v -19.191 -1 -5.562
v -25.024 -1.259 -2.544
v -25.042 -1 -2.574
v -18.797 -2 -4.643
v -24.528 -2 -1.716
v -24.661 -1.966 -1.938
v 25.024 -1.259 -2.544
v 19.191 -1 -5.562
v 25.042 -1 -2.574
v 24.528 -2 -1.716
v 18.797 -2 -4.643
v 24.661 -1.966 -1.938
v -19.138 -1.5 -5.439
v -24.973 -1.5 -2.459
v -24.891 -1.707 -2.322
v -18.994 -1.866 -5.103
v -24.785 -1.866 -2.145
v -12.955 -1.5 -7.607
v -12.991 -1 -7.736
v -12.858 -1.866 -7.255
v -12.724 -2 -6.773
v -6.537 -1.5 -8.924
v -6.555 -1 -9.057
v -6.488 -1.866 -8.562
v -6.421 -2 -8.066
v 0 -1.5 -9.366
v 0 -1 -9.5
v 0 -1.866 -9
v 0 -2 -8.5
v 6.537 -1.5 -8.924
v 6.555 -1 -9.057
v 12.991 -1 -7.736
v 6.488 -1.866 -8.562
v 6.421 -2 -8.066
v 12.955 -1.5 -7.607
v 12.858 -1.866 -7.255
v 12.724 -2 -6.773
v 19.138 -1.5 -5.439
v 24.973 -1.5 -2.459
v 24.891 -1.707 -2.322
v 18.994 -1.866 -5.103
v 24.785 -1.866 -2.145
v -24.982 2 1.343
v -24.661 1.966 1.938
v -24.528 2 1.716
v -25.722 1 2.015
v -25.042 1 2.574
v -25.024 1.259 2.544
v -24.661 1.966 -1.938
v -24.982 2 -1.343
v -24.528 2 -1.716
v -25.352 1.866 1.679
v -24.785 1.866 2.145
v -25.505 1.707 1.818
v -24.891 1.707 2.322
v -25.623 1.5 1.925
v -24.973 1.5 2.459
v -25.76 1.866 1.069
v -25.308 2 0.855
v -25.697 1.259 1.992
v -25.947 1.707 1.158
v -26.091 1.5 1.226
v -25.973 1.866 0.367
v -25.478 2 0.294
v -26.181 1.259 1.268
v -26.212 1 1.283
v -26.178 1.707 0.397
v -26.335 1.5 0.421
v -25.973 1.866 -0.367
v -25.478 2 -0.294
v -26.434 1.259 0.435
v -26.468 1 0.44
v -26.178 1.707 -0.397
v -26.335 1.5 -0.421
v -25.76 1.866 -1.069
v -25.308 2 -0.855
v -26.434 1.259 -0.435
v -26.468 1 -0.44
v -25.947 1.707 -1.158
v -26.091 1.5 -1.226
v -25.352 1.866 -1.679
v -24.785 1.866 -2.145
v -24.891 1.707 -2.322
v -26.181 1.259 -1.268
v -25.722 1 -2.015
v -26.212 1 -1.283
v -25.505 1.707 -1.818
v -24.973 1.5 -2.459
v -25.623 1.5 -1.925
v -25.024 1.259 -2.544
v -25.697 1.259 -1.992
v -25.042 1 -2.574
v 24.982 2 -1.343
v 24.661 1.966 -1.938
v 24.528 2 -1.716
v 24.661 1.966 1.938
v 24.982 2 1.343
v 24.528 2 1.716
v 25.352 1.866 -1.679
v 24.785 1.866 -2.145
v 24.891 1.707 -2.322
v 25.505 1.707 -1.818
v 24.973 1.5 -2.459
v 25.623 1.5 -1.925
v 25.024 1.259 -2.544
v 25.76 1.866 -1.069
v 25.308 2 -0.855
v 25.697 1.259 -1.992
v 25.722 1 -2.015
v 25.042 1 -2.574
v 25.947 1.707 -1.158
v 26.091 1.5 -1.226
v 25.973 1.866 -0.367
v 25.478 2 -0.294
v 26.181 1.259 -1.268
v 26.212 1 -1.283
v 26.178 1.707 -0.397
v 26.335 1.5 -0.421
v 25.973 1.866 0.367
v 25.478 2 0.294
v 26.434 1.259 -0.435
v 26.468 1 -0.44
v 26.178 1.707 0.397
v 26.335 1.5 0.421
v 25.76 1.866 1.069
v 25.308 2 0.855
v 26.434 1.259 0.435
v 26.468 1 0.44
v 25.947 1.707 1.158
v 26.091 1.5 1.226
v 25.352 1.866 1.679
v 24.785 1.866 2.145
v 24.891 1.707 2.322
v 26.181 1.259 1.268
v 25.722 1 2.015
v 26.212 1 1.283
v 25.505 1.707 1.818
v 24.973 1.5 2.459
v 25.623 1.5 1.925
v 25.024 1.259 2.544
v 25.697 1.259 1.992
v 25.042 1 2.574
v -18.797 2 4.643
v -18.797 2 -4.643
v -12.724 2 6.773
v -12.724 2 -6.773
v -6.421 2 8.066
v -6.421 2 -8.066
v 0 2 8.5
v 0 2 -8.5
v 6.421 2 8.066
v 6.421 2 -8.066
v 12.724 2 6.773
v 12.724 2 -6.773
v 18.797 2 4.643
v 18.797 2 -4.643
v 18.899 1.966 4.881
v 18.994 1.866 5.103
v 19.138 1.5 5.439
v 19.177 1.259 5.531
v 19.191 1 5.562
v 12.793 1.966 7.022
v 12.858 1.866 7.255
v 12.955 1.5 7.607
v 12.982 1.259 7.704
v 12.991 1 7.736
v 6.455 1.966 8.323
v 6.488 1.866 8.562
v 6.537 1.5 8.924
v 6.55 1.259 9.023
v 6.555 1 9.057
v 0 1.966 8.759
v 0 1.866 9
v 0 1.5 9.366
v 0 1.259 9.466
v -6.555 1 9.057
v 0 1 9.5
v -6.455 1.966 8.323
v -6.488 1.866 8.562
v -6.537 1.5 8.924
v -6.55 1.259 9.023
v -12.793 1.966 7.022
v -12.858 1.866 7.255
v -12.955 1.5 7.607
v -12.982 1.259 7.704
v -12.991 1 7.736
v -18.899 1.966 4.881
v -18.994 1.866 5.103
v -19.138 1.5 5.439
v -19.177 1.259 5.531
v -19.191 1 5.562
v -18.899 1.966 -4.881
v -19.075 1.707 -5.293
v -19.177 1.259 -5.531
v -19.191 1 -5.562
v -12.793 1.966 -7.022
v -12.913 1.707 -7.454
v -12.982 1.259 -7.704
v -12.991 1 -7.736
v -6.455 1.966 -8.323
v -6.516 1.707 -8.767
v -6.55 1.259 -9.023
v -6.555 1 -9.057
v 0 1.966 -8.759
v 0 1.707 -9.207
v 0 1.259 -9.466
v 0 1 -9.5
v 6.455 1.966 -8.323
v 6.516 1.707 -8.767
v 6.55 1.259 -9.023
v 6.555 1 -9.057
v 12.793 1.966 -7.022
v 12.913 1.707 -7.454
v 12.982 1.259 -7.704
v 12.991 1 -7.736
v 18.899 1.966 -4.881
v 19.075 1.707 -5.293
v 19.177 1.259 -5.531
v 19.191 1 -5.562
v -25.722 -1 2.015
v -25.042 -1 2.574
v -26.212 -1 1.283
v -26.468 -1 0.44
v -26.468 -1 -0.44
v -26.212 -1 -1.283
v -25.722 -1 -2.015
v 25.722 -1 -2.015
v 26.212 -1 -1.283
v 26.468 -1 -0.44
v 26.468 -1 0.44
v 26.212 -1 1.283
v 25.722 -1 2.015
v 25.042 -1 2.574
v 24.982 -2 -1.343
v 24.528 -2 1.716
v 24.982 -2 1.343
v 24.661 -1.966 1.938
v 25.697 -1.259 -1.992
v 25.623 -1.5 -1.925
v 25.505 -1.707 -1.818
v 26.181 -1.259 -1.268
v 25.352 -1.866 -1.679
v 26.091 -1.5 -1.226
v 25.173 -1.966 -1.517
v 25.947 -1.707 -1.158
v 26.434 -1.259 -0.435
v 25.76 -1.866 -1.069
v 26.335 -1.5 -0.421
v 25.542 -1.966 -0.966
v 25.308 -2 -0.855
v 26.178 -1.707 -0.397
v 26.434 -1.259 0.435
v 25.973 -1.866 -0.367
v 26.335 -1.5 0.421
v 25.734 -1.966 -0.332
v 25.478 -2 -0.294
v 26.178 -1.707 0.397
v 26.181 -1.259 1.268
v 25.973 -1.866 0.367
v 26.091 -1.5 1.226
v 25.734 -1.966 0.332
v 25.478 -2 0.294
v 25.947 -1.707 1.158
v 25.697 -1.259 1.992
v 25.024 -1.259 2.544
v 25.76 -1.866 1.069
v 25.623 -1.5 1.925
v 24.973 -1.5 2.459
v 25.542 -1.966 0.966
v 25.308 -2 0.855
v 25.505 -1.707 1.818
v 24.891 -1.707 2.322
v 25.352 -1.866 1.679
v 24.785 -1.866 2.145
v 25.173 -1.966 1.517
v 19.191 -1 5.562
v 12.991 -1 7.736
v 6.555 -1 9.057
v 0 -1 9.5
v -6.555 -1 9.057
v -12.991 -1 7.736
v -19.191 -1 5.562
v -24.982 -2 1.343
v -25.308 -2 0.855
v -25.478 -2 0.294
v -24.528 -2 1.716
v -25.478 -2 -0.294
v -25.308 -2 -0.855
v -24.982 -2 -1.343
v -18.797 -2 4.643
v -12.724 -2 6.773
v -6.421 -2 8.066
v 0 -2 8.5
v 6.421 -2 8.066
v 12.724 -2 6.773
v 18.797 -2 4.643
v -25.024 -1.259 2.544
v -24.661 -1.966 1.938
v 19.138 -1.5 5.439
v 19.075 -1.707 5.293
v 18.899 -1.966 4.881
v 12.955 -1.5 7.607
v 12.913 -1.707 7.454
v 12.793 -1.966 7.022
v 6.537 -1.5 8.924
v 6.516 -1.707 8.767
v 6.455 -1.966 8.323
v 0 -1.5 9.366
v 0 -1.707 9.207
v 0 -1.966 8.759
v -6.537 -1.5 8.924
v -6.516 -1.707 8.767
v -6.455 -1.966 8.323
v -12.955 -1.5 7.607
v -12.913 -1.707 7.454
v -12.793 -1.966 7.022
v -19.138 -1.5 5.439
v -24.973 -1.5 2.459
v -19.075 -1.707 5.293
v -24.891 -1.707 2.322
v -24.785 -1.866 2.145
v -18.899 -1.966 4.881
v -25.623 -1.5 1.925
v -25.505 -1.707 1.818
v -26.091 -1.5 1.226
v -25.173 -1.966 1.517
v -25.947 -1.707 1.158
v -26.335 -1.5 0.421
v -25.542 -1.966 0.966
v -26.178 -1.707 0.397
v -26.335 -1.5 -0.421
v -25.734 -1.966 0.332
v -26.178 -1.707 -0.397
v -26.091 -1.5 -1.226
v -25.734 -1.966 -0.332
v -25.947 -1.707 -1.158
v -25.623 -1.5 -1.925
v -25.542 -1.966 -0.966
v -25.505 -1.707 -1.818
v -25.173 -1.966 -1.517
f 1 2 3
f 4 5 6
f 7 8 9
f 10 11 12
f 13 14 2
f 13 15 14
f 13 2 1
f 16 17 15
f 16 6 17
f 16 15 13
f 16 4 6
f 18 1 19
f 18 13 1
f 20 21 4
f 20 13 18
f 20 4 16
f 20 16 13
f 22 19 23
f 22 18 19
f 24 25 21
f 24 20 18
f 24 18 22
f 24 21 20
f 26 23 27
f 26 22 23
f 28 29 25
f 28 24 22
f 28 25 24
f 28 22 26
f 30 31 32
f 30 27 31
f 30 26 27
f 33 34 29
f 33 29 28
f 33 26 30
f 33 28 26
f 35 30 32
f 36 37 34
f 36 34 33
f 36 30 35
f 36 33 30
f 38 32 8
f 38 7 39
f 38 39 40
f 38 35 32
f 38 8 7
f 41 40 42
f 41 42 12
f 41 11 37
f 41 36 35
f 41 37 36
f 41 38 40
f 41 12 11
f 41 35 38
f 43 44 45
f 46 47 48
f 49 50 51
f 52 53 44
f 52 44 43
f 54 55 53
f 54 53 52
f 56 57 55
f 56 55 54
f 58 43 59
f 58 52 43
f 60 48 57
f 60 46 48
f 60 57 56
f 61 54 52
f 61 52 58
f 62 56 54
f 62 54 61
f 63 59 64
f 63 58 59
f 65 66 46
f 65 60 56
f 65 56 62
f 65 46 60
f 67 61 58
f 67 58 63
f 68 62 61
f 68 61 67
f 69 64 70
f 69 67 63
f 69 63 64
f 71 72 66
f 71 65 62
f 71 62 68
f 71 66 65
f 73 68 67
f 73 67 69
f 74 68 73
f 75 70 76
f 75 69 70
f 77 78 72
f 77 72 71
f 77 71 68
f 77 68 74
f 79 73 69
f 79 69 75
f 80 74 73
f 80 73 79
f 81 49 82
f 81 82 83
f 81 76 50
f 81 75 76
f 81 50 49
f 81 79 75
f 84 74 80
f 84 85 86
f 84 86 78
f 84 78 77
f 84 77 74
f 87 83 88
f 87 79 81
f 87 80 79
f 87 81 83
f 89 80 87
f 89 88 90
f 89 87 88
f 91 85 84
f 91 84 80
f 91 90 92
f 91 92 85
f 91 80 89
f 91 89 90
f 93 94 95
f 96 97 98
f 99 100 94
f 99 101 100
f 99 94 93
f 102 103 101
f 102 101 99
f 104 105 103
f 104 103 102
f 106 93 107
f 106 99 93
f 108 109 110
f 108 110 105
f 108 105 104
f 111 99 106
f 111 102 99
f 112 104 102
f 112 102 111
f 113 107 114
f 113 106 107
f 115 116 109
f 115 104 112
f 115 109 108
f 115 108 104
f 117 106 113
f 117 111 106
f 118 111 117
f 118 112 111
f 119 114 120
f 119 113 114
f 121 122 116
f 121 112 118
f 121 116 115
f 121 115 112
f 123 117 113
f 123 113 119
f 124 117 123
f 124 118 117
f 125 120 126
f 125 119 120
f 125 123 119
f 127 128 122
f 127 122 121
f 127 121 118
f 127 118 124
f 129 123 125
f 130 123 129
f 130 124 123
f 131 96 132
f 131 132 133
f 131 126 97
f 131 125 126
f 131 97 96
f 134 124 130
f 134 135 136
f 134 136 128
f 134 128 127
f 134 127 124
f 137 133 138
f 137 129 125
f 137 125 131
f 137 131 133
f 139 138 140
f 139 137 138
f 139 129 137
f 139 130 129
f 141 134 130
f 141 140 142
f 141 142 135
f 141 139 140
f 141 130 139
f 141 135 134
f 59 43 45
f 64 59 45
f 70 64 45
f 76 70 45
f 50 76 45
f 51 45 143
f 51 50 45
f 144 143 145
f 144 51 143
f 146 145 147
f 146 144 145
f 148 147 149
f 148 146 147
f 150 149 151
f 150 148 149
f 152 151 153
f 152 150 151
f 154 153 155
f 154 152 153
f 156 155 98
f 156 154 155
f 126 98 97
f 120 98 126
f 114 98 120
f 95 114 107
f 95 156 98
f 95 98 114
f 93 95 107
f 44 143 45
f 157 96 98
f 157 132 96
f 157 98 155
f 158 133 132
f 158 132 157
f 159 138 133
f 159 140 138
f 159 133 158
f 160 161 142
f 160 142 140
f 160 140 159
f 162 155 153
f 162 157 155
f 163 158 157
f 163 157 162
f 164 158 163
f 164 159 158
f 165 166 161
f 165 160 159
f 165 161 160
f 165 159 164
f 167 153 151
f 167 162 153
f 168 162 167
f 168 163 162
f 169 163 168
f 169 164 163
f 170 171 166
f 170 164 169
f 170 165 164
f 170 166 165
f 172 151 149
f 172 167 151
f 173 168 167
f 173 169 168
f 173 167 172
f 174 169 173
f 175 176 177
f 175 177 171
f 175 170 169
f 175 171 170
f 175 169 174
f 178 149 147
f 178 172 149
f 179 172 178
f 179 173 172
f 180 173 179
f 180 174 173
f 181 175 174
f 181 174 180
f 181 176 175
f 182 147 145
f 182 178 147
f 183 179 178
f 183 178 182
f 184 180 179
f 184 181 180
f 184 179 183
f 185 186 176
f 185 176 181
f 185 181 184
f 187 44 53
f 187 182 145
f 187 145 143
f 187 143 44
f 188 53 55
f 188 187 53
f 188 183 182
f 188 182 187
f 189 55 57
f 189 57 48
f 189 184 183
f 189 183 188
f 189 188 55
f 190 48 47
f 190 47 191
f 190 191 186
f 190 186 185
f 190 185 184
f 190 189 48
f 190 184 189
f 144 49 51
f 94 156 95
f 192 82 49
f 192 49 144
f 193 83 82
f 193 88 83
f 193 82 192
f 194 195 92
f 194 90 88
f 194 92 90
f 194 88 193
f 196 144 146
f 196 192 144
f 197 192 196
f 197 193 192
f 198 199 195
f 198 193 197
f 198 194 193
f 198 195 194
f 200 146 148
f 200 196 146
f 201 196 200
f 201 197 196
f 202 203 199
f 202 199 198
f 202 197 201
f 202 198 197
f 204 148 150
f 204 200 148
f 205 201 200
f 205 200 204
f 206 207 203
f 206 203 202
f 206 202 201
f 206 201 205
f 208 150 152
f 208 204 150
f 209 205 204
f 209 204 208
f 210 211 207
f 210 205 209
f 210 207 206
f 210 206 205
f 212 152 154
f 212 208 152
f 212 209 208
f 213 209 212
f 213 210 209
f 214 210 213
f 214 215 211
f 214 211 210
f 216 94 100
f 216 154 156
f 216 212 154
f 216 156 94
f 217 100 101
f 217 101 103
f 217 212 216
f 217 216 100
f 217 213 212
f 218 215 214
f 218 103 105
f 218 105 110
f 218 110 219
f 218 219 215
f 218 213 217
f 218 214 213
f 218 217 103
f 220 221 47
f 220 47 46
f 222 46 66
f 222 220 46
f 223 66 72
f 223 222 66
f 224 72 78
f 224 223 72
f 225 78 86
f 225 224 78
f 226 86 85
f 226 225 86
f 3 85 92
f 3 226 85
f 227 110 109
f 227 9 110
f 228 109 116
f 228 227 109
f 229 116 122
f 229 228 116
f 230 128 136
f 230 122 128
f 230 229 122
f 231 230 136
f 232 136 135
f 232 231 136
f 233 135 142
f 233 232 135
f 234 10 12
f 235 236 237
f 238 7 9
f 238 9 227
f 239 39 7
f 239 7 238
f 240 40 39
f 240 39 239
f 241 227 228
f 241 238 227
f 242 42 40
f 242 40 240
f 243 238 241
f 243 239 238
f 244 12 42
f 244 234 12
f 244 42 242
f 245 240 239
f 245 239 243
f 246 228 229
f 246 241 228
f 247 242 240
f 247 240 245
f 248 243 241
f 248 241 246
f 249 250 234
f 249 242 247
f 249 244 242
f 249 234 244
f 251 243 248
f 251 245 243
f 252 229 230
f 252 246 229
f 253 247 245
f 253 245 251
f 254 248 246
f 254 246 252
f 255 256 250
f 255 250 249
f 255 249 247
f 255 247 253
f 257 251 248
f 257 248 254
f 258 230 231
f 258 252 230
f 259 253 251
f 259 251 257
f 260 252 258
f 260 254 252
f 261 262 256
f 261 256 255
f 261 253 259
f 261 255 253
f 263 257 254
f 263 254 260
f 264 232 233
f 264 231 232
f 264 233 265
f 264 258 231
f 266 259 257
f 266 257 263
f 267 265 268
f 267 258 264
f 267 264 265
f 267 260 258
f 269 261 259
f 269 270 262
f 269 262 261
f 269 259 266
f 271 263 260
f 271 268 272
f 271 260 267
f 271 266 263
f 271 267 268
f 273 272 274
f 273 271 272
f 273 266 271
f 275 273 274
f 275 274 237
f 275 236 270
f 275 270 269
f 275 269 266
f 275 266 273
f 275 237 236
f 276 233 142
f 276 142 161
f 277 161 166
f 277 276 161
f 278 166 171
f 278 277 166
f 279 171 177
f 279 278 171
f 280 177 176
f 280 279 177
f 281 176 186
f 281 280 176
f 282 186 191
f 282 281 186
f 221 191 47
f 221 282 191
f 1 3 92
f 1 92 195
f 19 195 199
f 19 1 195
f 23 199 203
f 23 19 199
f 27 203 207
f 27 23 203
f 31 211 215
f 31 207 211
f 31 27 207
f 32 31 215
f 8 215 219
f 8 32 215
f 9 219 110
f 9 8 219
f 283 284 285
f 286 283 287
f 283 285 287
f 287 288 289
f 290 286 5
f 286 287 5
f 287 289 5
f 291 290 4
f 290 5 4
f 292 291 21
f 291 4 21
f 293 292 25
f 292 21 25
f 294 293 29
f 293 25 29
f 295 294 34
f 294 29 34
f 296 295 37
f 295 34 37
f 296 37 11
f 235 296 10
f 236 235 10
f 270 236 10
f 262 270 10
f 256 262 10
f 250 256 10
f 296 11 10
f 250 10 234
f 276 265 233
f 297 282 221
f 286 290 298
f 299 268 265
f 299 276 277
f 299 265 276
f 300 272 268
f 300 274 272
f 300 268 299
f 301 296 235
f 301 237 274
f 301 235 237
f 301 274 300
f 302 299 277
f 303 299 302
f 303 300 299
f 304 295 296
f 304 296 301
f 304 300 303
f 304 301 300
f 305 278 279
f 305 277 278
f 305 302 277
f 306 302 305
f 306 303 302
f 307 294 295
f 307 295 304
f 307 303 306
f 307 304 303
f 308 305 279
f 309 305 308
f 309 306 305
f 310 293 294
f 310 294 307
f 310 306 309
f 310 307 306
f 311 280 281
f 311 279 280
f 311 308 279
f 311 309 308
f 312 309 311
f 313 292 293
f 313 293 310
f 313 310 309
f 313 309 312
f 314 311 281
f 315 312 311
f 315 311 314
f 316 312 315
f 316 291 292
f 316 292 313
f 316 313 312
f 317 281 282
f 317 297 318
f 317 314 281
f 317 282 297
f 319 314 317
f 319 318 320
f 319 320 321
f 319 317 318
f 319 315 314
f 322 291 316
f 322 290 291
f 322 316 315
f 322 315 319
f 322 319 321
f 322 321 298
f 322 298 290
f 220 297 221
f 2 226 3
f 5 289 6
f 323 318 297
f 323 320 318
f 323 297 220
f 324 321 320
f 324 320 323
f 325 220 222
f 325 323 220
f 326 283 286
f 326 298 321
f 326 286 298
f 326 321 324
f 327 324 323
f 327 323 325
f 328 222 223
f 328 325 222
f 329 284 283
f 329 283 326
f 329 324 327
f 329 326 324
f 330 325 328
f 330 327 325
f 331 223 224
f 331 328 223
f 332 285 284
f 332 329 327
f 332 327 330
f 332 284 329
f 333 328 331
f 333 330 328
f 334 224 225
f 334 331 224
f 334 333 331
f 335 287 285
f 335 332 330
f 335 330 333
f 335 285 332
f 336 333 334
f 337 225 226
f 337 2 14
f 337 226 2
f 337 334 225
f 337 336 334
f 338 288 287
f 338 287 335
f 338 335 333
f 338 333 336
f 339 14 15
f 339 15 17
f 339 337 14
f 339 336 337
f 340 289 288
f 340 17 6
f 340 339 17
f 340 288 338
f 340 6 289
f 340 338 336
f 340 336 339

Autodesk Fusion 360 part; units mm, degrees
sketch "Sketch1" plane through (0, 0, 0) normal (0, 0, 1) x (1, 0, 0)
  line L0 (31.5, -2) -> (-31.5, -2)
  line L1 (-31.5, -2) -> (-31.5, 2)
  line L2 (-31.5, 2) -> (31.5, 2)
  line L3 (31.5, 2) -> (31.5, -2)
  line L4 (31.5, -2) -> (-31.5, 2) construction
  line L5 (-31.5, -2) -> (31.5, 2) construction
  dimension "d8" = 4
  dimension "d9" = 63
extrude "Extrude1" add sketch "Sketch1" along normal mid plane 20 makes body 1
sketch "Sketch2" plane through (0, 0, 0) normal (0, 1, 0) x (1, 0, 0)
  arc A0 (25.0416, 2.5736) -> (-25.0416, 2.5736) centre (0, -39.2308) ccw
  arc A1 (-25.0416, -2.5736) -> (25.0416, -2.5736) centre (0, 39.2308) ccw
  circle A2 centre (-23.5, 0) radius 3
  circle A3 centre (23.5, 0) radius 3
  point P0 (-26.5, 0)
  point P1 (26.5, 0)
  point P2 (0, 9.5)
  point P3 (0, -9.5)
  dimension "d12" = 6
  dimension "d13" = 6
  dimension "d14" = 53
  dimension "d15" = 19
extrude "Extrude2" add sketch "Sketch2" along normal mid plane 4 separate body makes body 2
fillet "Fillet1" radius 1 8 edges at (0, 2, -9.5) (-26.5, 2, 0) (0, 2, 9.5) (26.5, 2, 0) (0, -2, -9.5) (26.5, -2, 0) (0, -2, 9.5) (-26.5, -2, 0) on bodies 2
sketch "Sketch4" plane through (0, 0, 0) normal (0, 0, 1) x (1, 0, 0)
hidden bodies 1
equation "LamelloLength = 53 mm" comment "Size20 = 56mm; Size10 = 53 mm; Size0 = 47 mm; SizeH9 = 38 mm"
equation "LamelloWidth = 19 mm" comment "Size20 = 23mm; Size10 = 19mm; Size0 = 15 mm; SizeH9 =12 mm"
equation "LamelloThickness = 4 mm" comment "Size20 = 4mm; Size10 = 4 mm; Size0 = 4 mm; SizeH9 = 3mm"
equation "Tolerance = 1 mm" comment "Recommended tolerance for cutting"
equation "GrooveLength = LamelloLength + Tolerance + 9 mm"
equation "GrooveWidth = LamelloWidth + 1 mm"
equation "GrooveThickness = LamelloThickness"
equation "d8 = GrooveThickness"
equation "d9 = GrooveLength"
equation "d10 = GrooveWidth"
equation "d14 = LamelloLength"
equation "d15 = LamelloWidth"
equation "d16 = LamelloThickness"
properties part number "S10"
